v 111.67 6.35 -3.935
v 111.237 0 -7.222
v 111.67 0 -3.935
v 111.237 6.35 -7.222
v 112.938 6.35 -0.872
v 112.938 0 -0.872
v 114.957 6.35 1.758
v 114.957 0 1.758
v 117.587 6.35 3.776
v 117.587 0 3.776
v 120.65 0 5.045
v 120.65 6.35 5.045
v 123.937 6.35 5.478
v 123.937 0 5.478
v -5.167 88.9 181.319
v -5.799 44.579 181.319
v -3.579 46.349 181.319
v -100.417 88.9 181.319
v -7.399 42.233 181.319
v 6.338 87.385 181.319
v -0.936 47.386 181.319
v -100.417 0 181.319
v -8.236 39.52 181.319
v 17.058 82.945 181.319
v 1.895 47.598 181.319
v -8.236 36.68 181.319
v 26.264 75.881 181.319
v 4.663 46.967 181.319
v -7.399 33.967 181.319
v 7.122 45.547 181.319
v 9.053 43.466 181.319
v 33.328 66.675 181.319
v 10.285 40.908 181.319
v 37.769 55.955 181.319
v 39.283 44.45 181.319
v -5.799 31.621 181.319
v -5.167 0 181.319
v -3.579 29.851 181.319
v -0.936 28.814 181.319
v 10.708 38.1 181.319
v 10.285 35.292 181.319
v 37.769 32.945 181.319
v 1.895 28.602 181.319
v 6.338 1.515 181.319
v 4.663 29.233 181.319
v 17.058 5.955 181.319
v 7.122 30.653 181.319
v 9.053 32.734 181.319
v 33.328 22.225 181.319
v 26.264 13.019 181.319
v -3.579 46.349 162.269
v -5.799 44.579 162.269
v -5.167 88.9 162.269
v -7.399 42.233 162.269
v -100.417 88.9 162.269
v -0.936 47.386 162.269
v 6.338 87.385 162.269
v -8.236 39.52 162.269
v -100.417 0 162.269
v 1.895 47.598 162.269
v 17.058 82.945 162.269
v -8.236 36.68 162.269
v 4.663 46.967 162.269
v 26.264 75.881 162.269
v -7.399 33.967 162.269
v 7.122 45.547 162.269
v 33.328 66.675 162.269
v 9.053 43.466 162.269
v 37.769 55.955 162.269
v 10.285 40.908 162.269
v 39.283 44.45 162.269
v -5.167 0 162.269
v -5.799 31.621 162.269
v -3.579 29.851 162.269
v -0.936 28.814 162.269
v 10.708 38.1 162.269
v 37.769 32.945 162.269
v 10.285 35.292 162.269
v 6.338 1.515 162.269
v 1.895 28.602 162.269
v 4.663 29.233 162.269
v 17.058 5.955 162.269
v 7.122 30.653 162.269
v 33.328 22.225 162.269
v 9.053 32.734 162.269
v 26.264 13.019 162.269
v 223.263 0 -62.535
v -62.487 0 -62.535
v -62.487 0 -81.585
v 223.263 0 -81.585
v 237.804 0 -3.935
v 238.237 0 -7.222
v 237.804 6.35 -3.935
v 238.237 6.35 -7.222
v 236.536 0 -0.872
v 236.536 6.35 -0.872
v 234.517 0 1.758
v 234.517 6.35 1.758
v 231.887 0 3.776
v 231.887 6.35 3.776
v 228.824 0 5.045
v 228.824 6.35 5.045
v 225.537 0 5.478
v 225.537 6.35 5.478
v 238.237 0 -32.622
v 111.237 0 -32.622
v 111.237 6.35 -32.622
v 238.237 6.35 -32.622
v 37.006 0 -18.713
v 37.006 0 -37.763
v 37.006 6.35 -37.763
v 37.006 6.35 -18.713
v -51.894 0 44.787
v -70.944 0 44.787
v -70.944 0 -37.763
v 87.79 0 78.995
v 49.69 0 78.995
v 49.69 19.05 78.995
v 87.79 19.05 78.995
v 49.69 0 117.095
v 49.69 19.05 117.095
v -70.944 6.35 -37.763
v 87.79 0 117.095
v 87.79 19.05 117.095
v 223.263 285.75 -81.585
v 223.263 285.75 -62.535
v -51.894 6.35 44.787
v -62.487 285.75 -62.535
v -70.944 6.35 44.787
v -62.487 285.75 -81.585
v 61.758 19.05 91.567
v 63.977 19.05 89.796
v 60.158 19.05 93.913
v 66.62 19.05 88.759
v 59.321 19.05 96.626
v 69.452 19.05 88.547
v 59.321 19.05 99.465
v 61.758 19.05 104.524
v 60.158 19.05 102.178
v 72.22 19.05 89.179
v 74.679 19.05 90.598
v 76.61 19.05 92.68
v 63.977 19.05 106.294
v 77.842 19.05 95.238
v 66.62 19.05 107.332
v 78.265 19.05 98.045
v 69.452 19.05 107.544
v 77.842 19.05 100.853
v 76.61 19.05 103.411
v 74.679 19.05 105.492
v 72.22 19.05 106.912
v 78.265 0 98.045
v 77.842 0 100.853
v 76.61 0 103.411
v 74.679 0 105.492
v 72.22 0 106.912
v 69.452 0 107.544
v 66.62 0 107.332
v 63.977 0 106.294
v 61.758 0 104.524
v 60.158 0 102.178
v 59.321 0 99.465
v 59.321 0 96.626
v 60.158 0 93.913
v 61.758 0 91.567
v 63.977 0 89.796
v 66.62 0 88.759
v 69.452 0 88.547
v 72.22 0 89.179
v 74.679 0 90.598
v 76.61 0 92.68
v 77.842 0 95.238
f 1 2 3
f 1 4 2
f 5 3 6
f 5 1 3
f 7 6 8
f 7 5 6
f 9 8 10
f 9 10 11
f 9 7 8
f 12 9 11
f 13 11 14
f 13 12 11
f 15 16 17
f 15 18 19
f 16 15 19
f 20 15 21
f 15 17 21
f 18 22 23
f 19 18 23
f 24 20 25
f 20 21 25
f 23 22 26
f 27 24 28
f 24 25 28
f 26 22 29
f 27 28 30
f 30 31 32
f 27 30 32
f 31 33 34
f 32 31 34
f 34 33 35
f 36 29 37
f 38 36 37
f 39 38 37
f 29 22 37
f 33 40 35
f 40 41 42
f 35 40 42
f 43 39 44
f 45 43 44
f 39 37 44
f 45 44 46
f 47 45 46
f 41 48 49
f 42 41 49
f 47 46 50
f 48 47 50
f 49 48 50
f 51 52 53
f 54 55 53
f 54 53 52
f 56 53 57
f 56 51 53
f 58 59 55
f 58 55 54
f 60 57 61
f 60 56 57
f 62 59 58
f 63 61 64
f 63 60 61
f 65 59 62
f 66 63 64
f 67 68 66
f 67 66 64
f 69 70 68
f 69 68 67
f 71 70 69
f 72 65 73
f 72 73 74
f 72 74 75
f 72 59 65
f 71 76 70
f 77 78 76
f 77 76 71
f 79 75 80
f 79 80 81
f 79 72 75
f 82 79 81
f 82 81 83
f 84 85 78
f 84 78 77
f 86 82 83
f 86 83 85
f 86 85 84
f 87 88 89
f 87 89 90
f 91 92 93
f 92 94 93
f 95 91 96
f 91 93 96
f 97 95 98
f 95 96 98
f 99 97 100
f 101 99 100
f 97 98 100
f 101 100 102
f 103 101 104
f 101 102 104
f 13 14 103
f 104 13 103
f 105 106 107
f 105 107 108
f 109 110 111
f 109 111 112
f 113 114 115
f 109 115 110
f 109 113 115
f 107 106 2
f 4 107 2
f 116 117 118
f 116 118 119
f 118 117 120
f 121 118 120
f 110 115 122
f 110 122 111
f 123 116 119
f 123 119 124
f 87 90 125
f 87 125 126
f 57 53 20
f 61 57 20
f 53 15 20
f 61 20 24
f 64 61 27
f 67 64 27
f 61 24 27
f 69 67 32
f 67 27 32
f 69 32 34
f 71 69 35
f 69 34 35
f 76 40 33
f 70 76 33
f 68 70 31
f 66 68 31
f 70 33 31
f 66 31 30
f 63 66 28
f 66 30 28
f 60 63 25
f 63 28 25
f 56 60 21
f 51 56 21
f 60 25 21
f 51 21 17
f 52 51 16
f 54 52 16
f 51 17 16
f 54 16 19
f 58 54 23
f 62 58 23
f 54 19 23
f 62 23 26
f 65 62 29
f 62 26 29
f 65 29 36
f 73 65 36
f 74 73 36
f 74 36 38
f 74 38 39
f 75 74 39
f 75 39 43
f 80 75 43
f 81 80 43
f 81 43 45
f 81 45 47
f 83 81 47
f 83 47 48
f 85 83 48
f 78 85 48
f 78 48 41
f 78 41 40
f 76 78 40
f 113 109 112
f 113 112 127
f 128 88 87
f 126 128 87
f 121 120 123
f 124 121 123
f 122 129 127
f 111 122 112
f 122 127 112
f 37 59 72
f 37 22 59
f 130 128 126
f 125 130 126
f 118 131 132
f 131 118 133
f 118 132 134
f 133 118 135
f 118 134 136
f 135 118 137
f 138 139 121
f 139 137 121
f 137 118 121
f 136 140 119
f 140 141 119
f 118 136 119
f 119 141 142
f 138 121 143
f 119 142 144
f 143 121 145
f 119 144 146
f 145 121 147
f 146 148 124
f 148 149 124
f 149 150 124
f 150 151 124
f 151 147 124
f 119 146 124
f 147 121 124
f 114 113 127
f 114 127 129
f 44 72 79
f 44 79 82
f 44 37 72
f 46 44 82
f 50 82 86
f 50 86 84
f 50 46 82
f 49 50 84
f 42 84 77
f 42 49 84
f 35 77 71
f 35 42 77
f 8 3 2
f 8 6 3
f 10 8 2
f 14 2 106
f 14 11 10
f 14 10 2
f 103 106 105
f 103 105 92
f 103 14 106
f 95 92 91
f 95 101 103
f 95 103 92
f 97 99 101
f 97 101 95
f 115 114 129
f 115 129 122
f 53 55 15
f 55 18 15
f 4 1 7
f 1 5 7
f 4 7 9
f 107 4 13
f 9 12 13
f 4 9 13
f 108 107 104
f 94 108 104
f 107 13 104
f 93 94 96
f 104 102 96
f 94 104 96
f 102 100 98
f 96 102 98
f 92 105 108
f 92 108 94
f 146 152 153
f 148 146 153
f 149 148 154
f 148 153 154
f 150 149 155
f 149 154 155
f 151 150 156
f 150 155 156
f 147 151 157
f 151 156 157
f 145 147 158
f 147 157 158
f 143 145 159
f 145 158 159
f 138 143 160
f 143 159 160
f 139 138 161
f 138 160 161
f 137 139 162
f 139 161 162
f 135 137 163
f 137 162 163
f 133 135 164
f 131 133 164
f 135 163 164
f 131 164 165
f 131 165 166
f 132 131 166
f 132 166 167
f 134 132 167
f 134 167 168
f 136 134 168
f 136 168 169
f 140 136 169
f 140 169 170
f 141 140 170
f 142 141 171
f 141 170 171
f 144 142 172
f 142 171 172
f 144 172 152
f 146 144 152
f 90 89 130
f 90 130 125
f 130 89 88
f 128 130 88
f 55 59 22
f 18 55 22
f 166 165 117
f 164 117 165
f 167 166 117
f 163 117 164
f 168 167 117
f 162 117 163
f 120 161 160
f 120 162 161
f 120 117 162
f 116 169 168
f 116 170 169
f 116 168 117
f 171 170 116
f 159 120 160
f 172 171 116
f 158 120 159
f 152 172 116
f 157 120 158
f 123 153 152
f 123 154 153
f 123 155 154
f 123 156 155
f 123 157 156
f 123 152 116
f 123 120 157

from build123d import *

# Parameters (mm, degrees)
F1_DEPTH  = 6.35
F0_W      = 127
F0_H      = 38.1
F2_R      = 12.7
F3_W      = 285.75
F3_H      = 19.05
F4_DEPTH  = 285.75
F5_W      = 38.1
F5_H      = 38.1
F5_R      = 9.525
F6_DEPTH  = 19.05
F7_W      = 139.7
F7_H      = 19.05
F8_DEPTH  = 88.9
F9_R      = 9.525
F10_DEPTH = 25.4
F11_R     = 44.44999


# Not quite as in the source:
# - a fillet or chamfer is up to 0.001 mm smaller than in the source, because OpenCascade refuses the exact size


with BuildPart() as f1:
    # F0 (on Front) → F1 (new body)
    with BuildSketch(Plane.XZ):
        Polygon((-51.8936398988, 44.7870248234), (-70.9436398988, 44.7870248234), (-70.9436398988, -37.7629751766), (37.0063601012, -37.7629751766), (37.0063601012, -18.7129751766), align=None)
    extrude(amount=-F1_DEPTH)


with BuildPart() as f1b:
    # F0 (on Front) → F1, piece 2 (new body)
    with BuildSketch(Plane.XZ):
        with Locations((174.7370118499, -13.572396946)):
            Rectangle(F0_W, F0_H)
    extrude(amount=-F1_DEPTH)

    # F2
    f2_edges = [f1b.edges().sort_by_distance(p)[0] for p in [
        (238.237012, 3.175, 5.477603),
        (111.237012, 3.175, 5.477603),
    ]]
    fillet(f2_edges, radius=F2_R)


with BuildPart() as f4:
    # F3 (on Front) → F4 (new body)
    with BuildSketch(Plane.XZ):
        with Locations((80.3878121078, -72.0597802344)):
            Rectangle(F3_W, F3_H)
    extrude(amount=-F4_DEPTH)


with BuildPart() as f6:
    # F5 (on Front) → F6 (new body)
    with BuildSketch(Plane.XZ):
        with Locations((68.7398687005, 98.0453198674)):
            Rectangle(F5_W, F5_H)
        with Locations((68.7398687005, 98.0453198674)):
            Circle(F5_R, mode=Mode.SUBTRACT)
    extrude(amount=-F6_DEPTH)


with BuildPart() as f8:
    # F7 (on Front) → F8 (new body)
    with BuildSketch(Plane.XZ):
        with Locations((-30.56688793, 171.7939794795)):
            Rectangle(F7_W, F7_H)
    extrude(amount=-F8_DEPTH)

    # F9 (on face) → F10 (cut)
    with BuildSketch(Plane.XY.offset(181.3189794795)):
        with Locations((1.18311207, 38.1)):
            Circle(F9_R)
    extrude(amount=-F10_DEPTH, mode=Mode.SUBTRACT)

    # F11 (radius 44.45 in the source; OpenCascade refuses exactly that, so slightly less here)
    f11_edges = [f8.edges().sort_by_distance(p)[0] for p in [
        (39.283112, 0, 171.793979),
        (39.283112, 88.9, 171.793979),
    ]]
    fillet(f11_edges, radius=F11_R)


solid = Compound([f1.part, f1b.part, f4.part, f6.part, f8.part])
